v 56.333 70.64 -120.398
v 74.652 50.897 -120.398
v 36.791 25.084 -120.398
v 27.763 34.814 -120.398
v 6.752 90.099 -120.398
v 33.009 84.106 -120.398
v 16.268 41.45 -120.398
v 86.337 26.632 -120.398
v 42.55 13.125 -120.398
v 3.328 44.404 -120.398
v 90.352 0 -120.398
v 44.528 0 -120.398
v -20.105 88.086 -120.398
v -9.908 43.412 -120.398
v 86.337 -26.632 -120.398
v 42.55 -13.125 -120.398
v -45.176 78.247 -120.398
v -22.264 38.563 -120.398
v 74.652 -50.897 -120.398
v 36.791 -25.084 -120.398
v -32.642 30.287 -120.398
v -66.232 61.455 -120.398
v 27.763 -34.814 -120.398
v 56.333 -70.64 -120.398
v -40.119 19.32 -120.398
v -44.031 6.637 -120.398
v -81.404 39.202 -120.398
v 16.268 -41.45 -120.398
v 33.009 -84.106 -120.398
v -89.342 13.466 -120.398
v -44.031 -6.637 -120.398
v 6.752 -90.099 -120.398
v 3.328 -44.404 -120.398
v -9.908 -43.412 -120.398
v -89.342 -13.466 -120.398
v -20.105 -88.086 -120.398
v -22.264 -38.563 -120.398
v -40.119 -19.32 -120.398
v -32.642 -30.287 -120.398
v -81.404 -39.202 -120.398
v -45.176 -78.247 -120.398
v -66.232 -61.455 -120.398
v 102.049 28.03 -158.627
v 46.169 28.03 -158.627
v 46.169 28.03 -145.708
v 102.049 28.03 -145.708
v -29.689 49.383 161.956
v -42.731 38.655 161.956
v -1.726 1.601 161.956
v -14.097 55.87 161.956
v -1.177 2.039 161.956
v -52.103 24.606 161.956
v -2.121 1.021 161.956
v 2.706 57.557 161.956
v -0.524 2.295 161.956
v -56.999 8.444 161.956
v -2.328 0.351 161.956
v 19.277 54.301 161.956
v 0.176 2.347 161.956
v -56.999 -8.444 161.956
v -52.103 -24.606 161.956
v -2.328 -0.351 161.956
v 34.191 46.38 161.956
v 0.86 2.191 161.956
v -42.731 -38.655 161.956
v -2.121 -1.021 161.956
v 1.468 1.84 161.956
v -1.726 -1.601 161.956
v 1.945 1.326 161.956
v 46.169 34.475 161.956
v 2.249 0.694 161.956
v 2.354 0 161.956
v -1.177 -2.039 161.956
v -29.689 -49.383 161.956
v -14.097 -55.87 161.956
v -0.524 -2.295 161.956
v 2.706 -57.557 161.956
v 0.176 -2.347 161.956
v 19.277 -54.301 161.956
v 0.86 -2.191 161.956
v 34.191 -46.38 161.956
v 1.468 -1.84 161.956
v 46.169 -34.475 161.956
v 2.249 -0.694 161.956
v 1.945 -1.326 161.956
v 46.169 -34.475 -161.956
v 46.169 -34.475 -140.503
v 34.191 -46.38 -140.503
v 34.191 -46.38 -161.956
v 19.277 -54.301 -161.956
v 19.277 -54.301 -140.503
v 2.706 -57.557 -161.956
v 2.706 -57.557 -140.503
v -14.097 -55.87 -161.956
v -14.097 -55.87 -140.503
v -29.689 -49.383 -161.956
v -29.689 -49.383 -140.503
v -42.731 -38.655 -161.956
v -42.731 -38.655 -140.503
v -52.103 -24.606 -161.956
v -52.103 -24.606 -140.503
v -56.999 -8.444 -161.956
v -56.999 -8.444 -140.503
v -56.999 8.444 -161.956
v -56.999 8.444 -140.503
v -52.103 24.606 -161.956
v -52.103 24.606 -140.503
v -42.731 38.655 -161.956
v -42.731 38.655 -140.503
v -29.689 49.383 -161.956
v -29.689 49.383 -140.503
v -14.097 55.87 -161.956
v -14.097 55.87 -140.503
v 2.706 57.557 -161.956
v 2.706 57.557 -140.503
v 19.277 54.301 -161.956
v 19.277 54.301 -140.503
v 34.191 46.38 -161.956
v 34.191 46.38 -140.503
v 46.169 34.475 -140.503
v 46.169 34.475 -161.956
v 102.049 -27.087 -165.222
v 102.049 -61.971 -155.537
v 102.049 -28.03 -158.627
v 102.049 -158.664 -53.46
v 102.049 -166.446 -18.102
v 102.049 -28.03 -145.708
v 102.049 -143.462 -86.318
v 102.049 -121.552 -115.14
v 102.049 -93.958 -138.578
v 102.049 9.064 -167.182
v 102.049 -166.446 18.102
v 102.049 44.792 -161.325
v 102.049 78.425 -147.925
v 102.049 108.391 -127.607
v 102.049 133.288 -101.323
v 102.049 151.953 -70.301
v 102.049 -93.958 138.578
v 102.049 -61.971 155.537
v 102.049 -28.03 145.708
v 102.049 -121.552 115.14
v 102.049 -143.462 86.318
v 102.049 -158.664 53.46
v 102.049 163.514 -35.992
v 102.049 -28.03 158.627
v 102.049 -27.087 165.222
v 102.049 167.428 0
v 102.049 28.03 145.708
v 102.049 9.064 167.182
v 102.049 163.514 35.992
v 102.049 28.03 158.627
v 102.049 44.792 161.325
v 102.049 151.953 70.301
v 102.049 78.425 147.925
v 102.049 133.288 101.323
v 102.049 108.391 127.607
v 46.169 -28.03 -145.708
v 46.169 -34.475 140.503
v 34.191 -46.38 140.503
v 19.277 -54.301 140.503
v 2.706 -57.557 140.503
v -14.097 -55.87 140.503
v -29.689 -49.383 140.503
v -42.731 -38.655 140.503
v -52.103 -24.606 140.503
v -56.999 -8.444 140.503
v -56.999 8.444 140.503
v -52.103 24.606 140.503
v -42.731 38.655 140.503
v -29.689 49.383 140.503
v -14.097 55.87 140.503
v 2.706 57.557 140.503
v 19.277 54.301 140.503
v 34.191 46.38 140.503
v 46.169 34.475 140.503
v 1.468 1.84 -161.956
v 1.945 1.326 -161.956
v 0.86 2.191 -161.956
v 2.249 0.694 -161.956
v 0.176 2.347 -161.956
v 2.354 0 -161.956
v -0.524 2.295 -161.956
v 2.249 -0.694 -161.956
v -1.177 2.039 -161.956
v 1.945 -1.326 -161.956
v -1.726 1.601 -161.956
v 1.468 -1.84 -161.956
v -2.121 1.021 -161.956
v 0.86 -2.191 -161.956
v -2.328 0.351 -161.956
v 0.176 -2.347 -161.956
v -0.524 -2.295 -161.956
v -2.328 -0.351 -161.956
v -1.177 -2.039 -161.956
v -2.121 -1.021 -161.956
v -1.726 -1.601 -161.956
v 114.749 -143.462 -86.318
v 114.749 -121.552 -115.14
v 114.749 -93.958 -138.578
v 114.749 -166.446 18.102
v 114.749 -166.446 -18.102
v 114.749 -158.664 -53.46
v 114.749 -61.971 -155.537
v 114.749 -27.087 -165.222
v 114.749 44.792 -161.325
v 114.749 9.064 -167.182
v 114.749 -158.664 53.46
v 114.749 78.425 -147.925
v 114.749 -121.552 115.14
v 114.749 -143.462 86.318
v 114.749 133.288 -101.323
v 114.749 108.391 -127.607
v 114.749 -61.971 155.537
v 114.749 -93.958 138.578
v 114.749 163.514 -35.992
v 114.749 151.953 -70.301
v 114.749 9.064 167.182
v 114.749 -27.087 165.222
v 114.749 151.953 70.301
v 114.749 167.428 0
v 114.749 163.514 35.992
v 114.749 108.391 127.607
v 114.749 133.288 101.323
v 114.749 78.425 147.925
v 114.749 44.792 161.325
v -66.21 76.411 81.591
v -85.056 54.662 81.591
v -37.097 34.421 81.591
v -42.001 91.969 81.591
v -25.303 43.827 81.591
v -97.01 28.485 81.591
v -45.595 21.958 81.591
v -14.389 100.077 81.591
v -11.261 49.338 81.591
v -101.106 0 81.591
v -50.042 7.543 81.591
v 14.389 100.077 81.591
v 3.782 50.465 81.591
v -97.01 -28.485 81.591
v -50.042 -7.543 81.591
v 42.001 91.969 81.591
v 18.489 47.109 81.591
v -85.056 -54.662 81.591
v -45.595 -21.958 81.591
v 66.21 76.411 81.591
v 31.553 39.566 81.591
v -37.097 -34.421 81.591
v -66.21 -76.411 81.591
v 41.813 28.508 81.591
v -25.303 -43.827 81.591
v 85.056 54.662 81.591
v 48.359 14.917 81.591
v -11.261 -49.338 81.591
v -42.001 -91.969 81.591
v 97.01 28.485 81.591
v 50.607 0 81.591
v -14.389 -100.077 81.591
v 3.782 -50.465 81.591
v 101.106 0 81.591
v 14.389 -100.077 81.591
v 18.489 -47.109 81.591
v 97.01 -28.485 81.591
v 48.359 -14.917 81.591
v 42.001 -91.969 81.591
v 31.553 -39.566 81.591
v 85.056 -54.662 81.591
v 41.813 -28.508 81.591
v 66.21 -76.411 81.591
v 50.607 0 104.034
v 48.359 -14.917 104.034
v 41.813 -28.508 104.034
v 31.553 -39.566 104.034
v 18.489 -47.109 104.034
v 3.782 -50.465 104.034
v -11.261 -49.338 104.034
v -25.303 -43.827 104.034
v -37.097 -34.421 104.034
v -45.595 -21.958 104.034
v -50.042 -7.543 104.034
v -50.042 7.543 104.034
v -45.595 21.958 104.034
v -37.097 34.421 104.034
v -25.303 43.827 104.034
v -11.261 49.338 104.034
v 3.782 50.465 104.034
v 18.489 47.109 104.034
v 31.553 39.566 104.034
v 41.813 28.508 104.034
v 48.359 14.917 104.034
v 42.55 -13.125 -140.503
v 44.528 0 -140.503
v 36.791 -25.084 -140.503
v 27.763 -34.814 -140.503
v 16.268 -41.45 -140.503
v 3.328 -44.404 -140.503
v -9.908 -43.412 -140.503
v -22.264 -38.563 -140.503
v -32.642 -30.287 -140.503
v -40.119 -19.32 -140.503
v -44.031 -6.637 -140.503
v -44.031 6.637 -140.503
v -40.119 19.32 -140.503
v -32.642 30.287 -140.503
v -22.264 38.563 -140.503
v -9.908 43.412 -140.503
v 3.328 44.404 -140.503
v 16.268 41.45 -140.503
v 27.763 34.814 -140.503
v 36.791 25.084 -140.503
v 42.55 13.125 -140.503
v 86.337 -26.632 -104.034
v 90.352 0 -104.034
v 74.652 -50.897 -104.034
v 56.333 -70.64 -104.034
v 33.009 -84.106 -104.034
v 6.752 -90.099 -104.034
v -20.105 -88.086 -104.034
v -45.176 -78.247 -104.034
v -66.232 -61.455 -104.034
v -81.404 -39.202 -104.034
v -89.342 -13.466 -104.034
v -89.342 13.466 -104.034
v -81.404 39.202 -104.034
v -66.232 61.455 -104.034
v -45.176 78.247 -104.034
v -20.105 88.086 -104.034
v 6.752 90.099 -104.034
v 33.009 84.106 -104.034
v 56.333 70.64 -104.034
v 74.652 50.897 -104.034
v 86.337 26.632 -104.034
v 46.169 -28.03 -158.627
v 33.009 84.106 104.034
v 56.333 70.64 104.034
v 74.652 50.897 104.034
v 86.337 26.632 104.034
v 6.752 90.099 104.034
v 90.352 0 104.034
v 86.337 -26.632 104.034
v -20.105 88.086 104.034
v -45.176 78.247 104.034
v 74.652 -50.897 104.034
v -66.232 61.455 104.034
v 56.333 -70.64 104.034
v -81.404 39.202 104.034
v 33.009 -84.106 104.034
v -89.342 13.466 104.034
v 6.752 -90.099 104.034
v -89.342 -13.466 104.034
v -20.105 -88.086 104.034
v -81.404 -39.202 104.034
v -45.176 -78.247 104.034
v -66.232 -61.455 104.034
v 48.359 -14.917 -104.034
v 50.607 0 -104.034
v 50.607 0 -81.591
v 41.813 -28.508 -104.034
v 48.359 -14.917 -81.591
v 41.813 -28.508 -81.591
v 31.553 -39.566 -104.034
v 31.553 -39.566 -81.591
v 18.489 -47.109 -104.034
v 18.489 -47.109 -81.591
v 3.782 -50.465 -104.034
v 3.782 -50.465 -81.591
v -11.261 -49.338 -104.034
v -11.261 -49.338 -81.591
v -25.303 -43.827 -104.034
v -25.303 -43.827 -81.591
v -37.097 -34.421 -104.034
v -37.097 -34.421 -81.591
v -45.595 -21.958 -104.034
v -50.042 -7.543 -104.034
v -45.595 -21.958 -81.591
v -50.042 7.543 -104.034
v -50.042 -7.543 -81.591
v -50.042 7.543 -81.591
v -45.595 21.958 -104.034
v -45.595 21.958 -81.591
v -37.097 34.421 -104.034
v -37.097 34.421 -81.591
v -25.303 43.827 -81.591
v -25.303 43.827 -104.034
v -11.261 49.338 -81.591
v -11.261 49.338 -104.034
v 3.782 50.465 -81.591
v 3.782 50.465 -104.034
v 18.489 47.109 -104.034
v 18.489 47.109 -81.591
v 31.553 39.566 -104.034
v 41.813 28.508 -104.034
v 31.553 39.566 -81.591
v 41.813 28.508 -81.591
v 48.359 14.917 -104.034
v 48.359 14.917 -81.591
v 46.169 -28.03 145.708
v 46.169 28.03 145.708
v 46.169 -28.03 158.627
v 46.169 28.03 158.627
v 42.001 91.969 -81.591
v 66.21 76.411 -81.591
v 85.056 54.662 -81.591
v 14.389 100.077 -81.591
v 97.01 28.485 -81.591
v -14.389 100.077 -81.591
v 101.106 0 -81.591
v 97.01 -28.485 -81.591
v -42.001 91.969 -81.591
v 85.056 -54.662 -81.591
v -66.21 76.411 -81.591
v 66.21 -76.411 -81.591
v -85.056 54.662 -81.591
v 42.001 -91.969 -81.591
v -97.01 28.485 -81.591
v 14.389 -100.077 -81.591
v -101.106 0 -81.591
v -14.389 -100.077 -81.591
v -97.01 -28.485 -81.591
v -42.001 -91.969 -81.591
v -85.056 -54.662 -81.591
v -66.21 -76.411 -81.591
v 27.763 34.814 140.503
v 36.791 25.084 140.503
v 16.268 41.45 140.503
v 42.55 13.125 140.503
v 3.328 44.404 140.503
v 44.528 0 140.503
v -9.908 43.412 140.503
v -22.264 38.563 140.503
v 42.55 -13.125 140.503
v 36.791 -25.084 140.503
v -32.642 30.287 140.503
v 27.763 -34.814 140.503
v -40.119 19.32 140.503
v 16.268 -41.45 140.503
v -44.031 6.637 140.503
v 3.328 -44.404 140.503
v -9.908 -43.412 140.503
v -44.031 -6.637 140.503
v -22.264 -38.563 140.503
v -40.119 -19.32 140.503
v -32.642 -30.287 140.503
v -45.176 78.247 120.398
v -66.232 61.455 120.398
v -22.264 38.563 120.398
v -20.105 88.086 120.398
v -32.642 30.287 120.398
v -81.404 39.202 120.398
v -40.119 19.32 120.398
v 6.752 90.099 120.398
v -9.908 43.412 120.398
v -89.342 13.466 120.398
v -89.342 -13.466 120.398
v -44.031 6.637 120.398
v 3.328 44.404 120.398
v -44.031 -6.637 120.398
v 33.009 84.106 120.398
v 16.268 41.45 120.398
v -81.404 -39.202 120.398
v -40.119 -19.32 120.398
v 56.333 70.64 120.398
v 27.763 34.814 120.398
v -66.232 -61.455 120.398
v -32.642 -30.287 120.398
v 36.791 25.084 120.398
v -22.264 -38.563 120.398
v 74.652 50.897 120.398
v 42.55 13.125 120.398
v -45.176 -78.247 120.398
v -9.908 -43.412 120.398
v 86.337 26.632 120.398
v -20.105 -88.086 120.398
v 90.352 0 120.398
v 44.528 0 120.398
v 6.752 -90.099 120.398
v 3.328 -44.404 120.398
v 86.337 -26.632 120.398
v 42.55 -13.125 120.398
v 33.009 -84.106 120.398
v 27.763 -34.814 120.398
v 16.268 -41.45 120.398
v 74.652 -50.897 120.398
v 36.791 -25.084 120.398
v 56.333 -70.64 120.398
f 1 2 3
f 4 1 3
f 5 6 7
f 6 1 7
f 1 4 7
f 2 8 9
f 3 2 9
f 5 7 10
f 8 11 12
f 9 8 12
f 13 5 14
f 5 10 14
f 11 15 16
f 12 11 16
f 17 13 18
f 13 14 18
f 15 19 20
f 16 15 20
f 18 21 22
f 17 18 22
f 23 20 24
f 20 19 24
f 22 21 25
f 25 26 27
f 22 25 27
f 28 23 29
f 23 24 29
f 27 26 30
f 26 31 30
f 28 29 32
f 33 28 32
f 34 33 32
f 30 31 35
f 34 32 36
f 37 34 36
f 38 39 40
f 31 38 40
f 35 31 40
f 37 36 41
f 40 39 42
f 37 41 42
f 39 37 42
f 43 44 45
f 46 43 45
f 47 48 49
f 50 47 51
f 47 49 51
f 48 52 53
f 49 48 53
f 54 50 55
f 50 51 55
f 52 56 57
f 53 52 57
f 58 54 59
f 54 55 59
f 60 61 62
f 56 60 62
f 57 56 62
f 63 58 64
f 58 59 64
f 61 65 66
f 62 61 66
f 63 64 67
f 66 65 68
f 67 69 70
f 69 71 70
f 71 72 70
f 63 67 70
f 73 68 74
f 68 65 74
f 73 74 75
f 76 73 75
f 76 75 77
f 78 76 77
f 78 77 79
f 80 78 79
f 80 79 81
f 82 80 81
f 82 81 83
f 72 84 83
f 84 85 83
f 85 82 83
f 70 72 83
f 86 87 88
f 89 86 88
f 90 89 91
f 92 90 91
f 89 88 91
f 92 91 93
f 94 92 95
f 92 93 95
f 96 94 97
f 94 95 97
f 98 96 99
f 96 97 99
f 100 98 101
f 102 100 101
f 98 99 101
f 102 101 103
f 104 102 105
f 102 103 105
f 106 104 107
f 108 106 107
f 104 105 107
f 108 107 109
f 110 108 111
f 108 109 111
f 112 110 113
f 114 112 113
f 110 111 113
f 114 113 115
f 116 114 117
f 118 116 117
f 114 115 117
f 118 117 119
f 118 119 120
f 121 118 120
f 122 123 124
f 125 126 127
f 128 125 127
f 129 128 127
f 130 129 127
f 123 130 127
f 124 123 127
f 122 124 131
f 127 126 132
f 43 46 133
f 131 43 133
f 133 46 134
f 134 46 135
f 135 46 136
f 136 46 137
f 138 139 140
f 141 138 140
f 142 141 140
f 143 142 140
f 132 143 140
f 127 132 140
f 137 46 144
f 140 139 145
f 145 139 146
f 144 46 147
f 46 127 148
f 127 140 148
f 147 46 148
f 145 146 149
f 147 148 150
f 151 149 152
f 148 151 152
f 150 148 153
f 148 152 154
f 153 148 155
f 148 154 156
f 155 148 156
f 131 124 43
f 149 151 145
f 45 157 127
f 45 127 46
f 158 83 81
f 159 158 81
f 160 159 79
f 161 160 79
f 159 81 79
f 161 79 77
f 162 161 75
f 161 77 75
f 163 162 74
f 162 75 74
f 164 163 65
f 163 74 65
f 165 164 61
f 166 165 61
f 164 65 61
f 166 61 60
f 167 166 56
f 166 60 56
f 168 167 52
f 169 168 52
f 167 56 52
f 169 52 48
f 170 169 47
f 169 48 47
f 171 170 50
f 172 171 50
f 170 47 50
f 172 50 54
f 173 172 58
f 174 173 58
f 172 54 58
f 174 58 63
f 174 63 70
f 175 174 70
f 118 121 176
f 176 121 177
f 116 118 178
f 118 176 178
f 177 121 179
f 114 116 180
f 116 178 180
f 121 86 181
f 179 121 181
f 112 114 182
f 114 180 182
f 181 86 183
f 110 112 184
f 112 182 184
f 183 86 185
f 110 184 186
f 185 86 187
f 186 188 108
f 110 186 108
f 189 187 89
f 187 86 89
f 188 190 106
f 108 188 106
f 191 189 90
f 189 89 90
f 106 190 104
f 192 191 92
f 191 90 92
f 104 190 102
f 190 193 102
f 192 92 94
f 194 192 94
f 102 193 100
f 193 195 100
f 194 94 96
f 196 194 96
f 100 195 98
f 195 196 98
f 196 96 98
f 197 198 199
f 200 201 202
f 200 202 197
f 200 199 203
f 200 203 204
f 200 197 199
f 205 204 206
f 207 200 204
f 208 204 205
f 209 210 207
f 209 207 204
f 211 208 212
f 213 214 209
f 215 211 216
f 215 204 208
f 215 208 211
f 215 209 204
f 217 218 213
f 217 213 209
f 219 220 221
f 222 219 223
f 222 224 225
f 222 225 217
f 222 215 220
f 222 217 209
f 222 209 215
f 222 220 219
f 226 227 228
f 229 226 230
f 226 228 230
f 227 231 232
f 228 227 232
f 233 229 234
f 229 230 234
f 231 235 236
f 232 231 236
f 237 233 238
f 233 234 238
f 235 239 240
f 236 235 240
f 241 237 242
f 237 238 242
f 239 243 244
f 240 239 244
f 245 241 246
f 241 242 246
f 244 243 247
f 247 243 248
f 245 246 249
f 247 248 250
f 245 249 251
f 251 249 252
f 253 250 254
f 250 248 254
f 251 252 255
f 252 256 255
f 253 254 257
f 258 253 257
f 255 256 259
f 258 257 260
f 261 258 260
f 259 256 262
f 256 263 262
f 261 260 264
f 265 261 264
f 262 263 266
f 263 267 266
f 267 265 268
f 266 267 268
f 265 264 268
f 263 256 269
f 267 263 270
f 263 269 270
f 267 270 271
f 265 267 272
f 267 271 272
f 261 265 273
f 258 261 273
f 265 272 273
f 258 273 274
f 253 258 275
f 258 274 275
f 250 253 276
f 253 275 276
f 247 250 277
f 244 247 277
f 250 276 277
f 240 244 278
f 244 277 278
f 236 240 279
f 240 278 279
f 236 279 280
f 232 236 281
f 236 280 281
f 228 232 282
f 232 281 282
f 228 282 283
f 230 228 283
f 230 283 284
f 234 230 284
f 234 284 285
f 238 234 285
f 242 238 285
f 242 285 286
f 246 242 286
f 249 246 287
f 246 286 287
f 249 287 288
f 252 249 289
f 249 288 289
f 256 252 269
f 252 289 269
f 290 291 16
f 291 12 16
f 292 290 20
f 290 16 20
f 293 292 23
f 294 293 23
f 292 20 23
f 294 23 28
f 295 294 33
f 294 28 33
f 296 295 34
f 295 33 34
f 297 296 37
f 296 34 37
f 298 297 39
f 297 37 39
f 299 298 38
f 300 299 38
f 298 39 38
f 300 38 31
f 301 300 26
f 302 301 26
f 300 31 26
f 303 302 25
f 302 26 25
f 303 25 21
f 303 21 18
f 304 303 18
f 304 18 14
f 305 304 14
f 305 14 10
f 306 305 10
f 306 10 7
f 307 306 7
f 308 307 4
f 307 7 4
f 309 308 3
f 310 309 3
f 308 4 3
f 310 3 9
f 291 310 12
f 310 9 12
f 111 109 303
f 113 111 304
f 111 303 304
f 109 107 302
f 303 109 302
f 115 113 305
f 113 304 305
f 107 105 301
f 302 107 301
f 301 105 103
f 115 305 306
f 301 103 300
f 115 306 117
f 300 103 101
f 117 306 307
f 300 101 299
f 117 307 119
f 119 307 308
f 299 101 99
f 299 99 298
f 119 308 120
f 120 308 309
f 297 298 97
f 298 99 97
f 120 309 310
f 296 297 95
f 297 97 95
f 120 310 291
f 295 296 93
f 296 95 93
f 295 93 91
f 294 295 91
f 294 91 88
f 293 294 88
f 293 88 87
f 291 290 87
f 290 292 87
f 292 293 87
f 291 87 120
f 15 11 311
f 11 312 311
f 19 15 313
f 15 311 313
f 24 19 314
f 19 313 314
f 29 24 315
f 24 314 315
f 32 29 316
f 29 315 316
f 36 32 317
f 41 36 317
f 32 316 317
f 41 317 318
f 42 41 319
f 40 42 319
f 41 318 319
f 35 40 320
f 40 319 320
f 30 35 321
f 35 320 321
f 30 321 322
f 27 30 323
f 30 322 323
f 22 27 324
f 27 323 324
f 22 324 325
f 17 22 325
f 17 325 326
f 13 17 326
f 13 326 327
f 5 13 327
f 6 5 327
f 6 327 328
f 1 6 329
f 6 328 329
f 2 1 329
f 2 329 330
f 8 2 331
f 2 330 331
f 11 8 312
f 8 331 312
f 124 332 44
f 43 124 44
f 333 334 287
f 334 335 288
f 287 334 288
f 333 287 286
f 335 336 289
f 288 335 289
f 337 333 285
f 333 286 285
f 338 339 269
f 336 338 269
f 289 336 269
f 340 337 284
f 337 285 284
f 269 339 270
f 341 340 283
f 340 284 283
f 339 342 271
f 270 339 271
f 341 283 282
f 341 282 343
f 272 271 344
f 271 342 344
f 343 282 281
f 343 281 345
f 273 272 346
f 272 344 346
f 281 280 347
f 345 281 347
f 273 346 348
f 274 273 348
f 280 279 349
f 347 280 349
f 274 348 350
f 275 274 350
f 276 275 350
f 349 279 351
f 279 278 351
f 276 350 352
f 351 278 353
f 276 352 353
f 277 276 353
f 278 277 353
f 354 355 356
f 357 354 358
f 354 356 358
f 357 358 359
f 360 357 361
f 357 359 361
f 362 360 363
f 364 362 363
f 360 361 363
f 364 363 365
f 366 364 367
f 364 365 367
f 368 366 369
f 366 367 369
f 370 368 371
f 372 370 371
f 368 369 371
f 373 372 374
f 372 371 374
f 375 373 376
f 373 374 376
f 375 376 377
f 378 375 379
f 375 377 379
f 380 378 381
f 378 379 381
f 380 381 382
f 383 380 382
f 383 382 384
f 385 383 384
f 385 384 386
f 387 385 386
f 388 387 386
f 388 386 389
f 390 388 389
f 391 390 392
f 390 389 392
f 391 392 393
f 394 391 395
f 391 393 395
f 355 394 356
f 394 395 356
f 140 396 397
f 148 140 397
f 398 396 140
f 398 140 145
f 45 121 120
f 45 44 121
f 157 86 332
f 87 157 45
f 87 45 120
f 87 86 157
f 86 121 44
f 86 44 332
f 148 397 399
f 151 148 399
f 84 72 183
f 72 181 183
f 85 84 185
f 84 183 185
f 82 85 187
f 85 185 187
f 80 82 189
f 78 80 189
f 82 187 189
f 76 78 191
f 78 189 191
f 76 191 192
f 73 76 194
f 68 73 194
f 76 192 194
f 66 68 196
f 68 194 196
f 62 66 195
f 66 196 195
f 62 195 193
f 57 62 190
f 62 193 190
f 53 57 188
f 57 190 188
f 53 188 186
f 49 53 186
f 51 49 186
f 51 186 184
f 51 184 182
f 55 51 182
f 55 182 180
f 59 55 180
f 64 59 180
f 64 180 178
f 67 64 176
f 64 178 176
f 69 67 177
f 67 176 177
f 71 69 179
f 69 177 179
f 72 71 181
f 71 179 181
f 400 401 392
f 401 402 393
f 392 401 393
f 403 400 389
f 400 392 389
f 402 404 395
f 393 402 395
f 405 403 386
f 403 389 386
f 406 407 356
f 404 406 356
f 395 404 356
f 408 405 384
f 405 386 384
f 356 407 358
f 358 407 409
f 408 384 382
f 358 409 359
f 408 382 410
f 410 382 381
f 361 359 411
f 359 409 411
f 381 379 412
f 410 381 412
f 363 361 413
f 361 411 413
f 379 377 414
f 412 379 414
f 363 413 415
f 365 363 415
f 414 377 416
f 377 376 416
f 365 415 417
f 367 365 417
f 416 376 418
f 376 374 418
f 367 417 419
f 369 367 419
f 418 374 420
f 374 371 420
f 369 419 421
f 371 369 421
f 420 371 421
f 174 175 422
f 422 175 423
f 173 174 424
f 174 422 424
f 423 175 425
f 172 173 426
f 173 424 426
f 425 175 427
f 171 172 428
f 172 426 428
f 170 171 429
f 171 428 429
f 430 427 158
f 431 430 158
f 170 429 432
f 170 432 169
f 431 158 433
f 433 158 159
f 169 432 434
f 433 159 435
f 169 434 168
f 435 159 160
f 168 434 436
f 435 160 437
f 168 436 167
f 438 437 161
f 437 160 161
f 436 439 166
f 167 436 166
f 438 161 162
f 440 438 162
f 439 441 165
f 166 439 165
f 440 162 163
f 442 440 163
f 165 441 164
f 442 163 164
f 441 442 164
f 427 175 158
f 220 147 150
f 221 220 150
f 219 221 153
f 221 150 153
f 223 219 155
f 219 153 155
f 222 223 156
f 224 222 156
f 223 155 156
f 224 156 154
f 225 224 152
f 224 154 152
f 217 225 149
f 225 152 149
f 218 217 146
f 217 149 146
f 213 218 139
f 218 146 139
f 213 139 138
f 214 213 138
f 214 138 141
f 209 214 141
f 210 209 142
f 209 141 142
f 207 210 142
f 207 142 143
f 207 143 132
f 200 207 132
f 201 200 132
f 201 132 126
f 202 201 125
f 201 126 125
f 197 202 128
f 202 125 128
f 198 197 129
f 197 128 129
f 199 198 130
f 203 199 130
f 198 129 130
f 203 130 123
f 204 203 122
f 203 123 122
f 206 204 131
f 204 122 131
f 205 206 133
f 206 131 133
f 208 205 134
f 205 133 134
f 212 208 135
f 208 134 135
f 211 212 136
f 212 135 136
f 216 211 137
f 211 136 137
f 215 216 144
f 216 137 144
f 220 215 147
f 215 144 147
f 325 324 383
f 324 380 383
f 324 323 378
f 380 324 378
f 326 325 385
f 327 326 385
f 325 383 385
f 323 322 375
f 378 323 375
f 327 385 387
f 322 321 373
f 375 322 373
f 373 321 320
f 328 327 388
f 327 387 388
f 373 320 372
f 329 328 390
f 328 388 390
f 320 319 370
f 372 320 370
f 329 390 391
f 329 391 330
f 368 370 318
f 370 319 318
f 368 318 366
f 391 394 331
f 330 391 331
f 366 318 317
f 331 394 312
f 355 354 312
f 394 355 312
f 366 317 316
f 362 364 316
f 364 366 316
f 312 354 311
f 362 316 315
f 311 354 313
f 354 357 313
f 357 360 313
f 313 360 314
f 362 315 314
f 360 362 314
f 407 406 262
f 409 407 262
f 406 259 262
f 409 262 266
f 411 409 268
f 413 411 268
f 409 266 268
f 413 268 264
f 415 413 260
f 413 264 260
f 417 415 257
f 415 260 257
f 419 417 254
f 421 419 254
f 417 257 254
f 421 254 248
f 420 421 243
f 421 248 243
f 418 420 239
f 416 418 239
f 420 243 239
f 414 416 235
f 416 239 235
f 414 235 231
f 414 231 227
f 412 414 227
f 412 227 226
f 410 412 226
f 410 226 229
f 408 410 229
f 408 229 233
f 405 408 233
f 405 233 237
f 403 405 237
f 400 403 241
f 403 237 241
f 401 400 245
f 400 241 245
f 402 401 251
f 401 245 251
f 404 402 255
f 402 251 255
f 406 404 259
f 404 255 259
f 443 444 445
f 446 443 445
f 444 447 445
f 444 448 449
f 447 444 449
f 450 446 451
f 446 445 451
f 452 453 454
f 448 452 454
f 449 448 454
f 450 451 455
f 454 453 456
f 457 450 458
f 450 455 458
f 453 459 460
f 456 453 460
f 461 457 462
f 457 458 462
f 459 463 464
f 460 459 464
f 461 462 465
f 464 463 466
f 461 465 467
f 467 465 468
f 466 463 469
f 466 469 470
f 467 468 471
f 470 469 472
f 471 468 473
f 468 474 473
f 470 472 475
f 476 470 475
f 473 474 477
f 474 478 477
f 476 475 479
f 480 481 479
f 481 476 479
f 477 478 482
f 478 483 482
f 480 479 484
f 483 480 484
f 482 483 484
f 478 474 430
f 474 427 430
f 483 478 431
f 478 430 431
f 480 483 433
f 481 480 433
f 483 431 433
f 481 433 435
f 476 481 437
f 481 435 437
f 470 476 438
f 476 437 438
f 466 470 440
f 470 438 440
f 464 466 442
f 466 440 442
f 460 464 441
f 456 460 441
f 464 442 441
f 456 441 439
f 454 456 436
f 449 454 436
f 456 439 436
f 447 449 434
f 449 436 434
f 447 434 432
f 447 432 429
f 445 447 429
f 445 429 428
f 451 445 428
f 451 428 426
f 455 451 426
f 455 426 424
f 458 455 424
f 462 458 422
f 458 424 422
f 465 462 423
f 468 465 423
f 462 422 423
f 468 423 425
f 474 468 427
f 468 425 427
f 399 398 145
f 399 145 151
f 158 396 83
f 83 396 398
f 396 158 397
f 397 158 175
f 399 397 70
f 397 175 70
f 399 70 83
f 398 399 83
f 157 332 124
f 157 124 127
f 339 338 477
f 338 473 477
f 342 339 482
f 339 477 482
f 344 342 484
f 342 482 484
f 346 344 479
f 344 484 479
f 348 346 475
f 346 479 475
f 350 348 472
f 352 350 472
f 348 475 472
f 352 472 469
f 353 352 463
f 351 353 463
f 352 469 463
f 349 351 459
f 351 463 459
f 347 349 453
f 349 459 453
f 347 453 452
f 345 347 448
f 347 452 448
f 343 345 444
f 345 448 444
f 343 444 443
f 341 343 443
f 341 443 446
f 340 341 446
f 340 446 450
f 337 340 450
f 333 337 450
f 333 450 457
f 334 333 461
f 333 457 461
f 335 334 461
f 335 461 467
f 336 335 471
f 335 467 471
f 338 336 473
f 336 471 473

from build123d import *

# Parameters (mm, degrees)
F2_W     = 69.451071322
F2_H     = 59.5968812704
F3_DEPTH = 127
F4_W     = 56.0608096421
F4_H     = 12.9187703133
F5_DEPTH = 55.88
F6_R     = 167.4278885547
F7_DEPTH = 12.7


with BuildPart() as f1:
    # F0 (on Front) → F1 (revolve)
    with BuildSketch(Plane.XZ):
        Polygon((19.2788038403, 161.9556288534), (2.3539757822, 161.9556288534), (2.3539757822, 0), (101.1059731245, 0), (101.1059731245, 81.5908461809), (50.6069213152, 81.5908461809), (50.6069213152, 104.0337234735), (90.3515517712, 104.0337234735), (90.3515517712, 120.3983277082), (44.5283316076, 120.3983277082), (44.5283316076, 140.5034065247), (57.6206743717, 140.5034065247), (57.6206743717, 161.9556288534), align=None)
        Polygon((101.1059731245, 0), (2.3539757822, 0), (2.3539757822, -142.8443711466), (2.3539757822, -161.9556288534), (19.2788038403, -161.9556288534), (57.6206743717, -161.9556288534), (57.6206743717, -140.5034065247), (44.5283316076, -140.5034065247), (44.5283316076, -120.3983277082), (90.3515517712, -120.3983277082), (90.3515517712, -104.0337234735), (50.6069213152, -104.0337234735), (50.6069213152, -81.5908461809), (101.1059731245, -81.5908461809), align=None)
    revolve(axis=Axis((0, 0, 9.5556288534), (0, 0, -1)))

    # F2 (on Front) → F3 (cut, symmetric)
    with BuildSketch(Plane.XZ):
        with Locations((80.894831568, 163.0262359977)):
            Rectangle(F2_W, F2_H)
        with Locations((80.894831568, -163.0262359977)):
            Rectangle(F2_W, F2_H)
    extrude(amount=F3_DEPTH, both=True, mode=Mode.SUBTRACT)

    # F4 (on face) → F5 (join)
    with BuildSketch(Plane.YZ.offset(46.169295907)):
        with Locations((0, 152.1677672863)):
            Rectangle(F4_W, F4_H)
        with Locations((0, -152.1677672863)):
            Rectangle(F4_W, F4_H)
    extrude(amount=F5_DEPTH)

    # F6 (on face) → F7 (join)
    with BuildSketch(Plane.YZ.offset(102.049295907)):
        Circle(F6_R)
    extrude(amount=F7_DEPTH)


solid = f1.part
